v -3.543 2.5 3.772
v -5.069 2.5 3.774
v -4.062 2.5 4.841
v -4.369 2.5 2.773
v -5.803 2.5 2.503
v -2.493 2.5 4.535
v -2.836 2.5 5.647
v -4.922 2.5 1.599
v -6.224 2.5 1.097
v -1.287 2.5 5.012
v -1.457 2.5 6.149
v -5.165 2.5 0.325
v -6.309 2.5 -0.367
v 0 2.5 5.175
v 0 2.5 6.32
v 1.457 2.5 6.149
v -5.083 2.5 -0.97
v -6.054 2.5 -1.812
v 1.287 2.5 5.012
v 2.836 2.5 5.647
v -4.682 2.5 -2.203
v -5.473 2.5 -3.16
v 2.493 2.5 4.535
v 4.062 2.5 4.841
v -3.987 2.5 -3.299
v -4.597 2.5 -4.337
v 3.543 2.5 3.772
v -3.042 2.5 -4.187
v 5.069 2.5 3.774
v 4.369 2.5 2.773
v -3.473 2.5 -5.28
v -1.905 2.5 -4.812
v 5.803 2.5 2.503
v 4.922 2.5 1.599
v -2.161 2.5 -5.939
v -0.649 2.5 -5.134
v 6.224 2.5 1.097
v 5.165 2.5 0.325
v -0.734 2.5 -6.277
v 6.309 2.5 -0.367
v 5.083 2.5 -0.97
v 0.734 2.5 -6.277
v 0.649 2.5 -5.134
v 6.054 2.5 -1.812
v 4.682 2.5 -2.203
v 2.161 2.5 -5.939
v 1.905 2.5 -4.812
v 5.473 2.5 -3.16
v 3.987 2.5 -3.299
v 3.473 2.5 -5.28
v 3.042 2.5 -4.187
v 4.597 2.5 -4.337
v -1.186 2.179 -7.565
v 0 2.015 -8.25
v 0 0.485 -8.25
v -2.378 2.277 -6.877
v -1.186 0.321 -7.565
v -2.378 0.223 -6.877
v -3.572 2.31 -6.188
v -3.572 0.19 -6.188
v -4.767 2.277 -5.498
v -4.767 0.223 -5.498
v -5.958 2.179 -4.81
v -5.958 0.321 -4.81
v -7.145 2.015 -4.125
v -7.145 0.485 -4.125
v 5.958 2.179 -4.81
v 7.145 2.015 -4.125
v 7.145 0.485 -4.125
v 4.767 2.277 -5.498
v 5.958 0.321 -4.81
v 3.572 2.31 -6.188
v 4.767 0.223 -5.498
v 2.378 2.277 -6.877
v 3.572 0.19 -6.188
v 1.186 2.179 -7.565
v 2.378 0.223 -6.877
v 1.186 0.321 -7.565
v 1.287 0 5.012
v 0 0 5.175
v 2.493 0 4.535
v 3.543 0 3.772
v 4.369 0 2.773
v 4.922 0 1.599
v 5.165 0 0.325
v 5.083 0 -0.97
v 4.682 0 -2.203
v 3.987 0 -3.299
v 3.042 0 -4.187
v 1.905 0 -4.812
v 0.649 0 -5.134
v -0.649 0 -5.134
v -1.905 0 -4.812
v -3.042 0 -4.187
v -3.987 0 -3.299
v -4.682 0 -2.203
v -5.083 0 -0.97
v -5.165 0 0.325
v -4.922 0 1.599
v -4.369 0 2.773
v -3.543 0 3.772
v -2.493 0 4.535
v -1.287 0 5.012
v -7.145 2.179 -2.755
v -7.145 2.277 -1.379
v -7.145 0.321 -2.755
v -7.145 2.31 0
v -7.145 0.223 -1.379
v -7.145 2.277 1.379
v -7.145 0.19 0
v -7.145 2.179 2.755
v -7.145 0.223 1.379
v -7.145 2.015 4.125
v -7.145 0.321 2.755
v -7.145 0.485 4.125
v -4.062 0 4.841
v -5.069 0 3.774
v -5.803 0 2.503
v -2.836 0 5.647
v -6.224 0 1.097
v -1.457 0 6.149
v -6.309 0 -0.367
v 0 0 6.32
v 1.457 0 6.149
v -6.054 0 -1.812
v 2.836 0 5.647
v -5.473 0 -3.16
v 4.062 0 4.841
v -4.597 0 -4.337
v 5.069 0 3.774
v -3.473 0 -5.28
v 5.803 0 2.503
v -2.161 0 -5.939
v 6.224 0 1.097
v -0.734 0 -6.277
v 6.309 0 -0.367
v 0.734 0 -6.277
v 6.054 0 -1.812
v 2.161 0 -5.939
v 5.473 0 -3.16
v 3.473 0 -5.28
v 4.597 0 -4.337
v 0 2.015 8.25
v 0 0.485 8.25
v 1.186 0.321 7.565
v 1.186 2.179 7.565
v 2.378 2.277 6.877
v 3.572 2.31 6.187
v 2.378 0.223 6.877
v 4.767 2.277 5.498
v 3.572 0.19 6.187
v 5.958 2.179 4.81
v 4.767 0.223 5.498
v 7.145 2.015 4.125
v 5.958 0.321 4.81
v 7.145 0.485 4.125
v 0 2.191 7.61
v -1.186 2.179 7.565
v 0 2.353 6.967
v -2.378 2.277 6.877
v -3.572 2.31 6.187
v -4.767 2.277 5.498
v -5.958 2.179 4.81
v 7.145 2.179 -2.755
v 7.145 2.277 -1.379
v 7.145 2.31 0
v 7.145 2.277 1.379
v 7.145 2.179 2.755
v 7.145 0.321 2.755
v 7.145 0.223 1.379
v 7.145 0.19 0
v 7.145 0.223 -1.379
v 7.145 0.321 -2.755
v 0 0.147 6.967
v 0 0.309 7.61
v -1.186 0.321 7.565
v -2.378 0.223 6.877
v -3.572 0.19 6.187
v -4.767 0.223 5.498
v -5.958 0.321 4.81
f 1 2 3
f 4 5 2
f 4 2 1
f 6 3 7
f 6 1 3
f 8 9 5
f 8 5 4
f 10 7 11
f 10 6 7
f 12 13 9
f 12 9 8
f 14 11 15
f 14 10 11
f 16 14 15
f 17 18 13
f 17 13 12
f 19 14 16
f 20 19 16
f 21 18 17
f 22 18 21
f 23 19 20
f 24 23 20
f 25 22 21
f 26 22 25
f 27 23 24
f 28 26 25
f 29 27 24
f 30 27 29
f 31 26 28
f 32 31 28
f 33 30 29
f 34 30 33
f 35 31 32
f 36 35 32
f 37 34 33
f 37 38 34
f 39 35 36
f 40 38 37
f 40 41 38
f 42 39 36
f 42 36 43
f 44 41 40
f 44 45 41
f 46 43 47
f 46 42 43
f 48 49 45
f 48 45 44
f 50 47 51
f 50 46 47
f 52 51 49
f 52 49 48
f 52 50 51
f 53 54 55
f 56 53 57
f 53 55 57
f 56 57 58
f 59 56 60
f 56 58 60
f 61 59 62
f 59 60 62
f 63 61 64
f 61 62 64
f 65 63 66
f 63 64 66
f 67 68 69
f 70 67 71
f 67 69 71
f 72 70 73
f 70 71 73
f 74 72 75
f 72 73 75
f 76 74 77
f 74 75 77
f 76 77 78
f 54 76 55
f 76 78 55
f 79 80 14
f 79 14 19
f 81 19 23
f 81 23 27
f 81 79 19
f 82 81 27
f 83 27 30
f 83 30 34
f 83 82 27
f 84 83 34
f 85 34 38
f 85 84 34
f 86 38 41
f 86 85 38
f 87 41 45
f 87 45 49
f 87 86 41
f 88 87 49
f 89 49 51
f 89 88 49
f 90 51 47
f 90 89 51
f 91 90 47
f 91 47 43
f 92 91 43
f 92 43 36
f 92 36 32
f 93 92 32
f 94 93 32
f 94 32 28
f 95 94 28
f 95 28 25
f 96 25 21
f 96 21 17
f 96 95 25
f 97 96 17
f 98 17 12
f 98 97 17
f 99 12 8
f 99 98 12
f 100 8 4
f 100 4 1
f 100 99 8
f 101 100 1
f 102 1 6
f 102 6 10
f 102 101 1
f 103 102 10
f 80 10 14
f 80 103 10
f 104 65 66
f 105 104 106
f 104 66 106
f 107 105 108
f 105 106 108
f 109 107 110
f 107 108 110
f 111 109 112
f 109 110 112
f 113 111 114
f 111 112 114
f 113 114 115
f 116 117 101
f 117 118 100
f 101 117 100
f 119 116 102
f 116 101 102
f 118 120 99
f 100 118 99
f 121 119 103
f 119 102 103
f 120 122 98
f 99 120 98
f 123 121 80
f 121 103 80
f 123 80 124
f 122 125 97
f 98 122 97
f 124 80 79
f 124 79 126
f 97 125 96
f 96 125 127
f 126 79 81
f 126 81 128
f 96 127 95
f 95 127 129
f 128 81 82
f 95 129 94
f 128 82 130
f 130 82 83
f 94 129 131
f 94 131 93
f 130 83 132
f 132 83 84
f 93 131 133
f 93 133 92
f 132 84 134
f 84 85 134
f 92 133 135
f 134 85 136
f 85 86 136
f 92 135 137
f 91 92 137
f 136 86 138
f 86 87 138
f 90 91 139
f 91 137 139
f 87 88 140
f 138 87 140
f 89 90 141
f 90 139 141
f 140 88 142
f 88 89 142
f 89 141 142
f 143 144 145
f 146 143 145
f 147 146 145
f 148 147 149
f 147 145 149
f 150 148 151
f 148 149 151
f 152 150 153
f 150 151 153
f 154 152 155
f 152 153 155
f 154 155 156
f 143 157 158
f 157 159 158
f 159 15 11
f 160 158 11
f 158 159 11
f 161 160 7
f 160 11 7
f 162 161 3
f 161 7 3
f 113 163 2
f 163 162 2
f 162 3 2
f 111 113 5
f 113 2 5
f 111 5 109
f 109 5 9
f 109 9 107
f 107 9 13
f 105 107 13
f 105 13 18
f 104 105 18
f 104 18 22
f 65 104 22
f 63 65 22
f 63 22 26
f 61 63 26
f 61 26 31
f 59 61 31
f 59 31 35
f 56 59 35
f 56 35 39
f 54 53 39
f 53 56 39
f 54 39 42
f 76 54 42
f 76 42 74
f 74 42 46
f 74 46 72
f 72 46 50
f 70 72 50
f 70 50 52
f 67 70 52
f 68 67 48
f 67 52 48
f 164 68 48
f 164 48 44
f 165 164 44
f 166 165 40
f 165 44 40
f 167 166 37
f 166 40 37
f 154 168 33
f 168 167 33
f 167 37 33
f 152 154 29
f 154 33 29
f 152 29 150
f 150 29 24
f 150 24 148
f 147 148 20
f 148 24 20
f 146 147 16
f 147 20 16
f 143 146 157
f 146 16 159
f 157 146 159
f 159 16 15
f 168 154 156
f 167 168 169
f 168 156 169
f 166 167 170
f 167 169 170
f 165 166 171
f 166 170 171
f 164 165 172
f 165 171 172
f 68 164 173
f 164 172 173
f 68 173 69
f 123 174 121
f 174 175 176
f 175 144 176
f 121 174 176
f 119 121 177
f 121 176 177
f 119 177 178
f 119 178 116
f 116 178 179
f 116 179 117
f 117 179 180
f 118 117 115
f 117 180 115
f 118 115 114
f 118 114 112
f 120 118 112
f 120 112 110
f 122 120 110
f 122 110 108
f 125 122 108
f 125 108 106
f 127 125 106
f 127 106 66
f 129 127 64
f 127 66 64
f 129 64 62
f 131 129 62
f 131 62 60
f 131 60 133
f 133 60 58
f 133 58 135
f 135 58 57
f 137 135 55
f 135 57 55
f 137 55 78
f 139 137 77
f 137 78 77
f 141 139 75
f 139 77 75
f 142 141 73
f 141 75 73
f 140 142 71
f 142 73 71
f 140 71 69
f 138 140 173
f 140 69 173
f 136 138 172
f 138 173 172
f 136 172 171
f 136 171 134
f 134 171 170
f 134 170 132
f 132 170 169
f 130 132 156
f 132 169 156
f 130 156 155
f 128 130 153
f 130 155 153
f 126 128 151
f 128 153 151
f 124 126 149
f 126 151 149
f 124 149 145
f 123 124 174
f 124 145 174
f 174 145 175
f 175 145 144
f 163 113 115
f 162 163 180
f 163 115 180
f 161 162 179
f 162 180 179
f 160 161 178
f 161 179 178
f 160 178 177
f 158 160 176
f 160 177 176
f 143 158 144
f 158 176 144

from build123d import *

# Parameters (mm, degrees)
SKETCH1_R           = 5.175
BOSS_EXTRUDE1_DEPTH = 2.5


with BuildPart() as part:
    # Sketch1 → Boss-Extrude1 (new body)
    with BuildSketch(Plane(origin=(0, 0, 0), x_dir=(1, 0, 0), z_dir=(0, 1, 0))):
        Polygon((0, 8.25), (-7.144709581, 4.125), (-7.144709581, -4.125), (0, -8.25), (7.144709581, -4.125), (7.144709581, 4.125), align=None)
        Circle(SKETCH1_R, mode=Mode.SUBTRACT)
    extrude(amount=BOSS_EXTRUDE1_DEPTH)

    # Sketch2 → Cut-Revolve3 (revolve, cut)
    with BuildSketch(Plane(origin=(1.914419162, 0, 0), x_dir=(1, 0, 0), z_dir=(0, 0, 1))):
        with BuildLine():
            Line((-1.914419162, 3.174819063), (-1.914419162, 16.07690266))
            ThreePointArc((-1.914419162, 16.07690266), (-17.205966927, 0.785354895), (-1.914419162, -14.506192869))
            Line((-1.914419162, -14.506192869), (-1.914419162, -0.674819063))
            ThreePointArc((-1.914419162, -0.674819063), (-7.281350854, -0.189682365), (-12.47429107, 1.25))
            ThreePointArc((-12.47429107, 1.25), (-7.281350854, 2.689682365), (-1.914419162, 3.174819063))
        make_face()
    revolve(axis=Axis((0, 4.297603661, 0), (0, -1, 0)), mode=Mode.SUBTRACT)


solid = part.part
